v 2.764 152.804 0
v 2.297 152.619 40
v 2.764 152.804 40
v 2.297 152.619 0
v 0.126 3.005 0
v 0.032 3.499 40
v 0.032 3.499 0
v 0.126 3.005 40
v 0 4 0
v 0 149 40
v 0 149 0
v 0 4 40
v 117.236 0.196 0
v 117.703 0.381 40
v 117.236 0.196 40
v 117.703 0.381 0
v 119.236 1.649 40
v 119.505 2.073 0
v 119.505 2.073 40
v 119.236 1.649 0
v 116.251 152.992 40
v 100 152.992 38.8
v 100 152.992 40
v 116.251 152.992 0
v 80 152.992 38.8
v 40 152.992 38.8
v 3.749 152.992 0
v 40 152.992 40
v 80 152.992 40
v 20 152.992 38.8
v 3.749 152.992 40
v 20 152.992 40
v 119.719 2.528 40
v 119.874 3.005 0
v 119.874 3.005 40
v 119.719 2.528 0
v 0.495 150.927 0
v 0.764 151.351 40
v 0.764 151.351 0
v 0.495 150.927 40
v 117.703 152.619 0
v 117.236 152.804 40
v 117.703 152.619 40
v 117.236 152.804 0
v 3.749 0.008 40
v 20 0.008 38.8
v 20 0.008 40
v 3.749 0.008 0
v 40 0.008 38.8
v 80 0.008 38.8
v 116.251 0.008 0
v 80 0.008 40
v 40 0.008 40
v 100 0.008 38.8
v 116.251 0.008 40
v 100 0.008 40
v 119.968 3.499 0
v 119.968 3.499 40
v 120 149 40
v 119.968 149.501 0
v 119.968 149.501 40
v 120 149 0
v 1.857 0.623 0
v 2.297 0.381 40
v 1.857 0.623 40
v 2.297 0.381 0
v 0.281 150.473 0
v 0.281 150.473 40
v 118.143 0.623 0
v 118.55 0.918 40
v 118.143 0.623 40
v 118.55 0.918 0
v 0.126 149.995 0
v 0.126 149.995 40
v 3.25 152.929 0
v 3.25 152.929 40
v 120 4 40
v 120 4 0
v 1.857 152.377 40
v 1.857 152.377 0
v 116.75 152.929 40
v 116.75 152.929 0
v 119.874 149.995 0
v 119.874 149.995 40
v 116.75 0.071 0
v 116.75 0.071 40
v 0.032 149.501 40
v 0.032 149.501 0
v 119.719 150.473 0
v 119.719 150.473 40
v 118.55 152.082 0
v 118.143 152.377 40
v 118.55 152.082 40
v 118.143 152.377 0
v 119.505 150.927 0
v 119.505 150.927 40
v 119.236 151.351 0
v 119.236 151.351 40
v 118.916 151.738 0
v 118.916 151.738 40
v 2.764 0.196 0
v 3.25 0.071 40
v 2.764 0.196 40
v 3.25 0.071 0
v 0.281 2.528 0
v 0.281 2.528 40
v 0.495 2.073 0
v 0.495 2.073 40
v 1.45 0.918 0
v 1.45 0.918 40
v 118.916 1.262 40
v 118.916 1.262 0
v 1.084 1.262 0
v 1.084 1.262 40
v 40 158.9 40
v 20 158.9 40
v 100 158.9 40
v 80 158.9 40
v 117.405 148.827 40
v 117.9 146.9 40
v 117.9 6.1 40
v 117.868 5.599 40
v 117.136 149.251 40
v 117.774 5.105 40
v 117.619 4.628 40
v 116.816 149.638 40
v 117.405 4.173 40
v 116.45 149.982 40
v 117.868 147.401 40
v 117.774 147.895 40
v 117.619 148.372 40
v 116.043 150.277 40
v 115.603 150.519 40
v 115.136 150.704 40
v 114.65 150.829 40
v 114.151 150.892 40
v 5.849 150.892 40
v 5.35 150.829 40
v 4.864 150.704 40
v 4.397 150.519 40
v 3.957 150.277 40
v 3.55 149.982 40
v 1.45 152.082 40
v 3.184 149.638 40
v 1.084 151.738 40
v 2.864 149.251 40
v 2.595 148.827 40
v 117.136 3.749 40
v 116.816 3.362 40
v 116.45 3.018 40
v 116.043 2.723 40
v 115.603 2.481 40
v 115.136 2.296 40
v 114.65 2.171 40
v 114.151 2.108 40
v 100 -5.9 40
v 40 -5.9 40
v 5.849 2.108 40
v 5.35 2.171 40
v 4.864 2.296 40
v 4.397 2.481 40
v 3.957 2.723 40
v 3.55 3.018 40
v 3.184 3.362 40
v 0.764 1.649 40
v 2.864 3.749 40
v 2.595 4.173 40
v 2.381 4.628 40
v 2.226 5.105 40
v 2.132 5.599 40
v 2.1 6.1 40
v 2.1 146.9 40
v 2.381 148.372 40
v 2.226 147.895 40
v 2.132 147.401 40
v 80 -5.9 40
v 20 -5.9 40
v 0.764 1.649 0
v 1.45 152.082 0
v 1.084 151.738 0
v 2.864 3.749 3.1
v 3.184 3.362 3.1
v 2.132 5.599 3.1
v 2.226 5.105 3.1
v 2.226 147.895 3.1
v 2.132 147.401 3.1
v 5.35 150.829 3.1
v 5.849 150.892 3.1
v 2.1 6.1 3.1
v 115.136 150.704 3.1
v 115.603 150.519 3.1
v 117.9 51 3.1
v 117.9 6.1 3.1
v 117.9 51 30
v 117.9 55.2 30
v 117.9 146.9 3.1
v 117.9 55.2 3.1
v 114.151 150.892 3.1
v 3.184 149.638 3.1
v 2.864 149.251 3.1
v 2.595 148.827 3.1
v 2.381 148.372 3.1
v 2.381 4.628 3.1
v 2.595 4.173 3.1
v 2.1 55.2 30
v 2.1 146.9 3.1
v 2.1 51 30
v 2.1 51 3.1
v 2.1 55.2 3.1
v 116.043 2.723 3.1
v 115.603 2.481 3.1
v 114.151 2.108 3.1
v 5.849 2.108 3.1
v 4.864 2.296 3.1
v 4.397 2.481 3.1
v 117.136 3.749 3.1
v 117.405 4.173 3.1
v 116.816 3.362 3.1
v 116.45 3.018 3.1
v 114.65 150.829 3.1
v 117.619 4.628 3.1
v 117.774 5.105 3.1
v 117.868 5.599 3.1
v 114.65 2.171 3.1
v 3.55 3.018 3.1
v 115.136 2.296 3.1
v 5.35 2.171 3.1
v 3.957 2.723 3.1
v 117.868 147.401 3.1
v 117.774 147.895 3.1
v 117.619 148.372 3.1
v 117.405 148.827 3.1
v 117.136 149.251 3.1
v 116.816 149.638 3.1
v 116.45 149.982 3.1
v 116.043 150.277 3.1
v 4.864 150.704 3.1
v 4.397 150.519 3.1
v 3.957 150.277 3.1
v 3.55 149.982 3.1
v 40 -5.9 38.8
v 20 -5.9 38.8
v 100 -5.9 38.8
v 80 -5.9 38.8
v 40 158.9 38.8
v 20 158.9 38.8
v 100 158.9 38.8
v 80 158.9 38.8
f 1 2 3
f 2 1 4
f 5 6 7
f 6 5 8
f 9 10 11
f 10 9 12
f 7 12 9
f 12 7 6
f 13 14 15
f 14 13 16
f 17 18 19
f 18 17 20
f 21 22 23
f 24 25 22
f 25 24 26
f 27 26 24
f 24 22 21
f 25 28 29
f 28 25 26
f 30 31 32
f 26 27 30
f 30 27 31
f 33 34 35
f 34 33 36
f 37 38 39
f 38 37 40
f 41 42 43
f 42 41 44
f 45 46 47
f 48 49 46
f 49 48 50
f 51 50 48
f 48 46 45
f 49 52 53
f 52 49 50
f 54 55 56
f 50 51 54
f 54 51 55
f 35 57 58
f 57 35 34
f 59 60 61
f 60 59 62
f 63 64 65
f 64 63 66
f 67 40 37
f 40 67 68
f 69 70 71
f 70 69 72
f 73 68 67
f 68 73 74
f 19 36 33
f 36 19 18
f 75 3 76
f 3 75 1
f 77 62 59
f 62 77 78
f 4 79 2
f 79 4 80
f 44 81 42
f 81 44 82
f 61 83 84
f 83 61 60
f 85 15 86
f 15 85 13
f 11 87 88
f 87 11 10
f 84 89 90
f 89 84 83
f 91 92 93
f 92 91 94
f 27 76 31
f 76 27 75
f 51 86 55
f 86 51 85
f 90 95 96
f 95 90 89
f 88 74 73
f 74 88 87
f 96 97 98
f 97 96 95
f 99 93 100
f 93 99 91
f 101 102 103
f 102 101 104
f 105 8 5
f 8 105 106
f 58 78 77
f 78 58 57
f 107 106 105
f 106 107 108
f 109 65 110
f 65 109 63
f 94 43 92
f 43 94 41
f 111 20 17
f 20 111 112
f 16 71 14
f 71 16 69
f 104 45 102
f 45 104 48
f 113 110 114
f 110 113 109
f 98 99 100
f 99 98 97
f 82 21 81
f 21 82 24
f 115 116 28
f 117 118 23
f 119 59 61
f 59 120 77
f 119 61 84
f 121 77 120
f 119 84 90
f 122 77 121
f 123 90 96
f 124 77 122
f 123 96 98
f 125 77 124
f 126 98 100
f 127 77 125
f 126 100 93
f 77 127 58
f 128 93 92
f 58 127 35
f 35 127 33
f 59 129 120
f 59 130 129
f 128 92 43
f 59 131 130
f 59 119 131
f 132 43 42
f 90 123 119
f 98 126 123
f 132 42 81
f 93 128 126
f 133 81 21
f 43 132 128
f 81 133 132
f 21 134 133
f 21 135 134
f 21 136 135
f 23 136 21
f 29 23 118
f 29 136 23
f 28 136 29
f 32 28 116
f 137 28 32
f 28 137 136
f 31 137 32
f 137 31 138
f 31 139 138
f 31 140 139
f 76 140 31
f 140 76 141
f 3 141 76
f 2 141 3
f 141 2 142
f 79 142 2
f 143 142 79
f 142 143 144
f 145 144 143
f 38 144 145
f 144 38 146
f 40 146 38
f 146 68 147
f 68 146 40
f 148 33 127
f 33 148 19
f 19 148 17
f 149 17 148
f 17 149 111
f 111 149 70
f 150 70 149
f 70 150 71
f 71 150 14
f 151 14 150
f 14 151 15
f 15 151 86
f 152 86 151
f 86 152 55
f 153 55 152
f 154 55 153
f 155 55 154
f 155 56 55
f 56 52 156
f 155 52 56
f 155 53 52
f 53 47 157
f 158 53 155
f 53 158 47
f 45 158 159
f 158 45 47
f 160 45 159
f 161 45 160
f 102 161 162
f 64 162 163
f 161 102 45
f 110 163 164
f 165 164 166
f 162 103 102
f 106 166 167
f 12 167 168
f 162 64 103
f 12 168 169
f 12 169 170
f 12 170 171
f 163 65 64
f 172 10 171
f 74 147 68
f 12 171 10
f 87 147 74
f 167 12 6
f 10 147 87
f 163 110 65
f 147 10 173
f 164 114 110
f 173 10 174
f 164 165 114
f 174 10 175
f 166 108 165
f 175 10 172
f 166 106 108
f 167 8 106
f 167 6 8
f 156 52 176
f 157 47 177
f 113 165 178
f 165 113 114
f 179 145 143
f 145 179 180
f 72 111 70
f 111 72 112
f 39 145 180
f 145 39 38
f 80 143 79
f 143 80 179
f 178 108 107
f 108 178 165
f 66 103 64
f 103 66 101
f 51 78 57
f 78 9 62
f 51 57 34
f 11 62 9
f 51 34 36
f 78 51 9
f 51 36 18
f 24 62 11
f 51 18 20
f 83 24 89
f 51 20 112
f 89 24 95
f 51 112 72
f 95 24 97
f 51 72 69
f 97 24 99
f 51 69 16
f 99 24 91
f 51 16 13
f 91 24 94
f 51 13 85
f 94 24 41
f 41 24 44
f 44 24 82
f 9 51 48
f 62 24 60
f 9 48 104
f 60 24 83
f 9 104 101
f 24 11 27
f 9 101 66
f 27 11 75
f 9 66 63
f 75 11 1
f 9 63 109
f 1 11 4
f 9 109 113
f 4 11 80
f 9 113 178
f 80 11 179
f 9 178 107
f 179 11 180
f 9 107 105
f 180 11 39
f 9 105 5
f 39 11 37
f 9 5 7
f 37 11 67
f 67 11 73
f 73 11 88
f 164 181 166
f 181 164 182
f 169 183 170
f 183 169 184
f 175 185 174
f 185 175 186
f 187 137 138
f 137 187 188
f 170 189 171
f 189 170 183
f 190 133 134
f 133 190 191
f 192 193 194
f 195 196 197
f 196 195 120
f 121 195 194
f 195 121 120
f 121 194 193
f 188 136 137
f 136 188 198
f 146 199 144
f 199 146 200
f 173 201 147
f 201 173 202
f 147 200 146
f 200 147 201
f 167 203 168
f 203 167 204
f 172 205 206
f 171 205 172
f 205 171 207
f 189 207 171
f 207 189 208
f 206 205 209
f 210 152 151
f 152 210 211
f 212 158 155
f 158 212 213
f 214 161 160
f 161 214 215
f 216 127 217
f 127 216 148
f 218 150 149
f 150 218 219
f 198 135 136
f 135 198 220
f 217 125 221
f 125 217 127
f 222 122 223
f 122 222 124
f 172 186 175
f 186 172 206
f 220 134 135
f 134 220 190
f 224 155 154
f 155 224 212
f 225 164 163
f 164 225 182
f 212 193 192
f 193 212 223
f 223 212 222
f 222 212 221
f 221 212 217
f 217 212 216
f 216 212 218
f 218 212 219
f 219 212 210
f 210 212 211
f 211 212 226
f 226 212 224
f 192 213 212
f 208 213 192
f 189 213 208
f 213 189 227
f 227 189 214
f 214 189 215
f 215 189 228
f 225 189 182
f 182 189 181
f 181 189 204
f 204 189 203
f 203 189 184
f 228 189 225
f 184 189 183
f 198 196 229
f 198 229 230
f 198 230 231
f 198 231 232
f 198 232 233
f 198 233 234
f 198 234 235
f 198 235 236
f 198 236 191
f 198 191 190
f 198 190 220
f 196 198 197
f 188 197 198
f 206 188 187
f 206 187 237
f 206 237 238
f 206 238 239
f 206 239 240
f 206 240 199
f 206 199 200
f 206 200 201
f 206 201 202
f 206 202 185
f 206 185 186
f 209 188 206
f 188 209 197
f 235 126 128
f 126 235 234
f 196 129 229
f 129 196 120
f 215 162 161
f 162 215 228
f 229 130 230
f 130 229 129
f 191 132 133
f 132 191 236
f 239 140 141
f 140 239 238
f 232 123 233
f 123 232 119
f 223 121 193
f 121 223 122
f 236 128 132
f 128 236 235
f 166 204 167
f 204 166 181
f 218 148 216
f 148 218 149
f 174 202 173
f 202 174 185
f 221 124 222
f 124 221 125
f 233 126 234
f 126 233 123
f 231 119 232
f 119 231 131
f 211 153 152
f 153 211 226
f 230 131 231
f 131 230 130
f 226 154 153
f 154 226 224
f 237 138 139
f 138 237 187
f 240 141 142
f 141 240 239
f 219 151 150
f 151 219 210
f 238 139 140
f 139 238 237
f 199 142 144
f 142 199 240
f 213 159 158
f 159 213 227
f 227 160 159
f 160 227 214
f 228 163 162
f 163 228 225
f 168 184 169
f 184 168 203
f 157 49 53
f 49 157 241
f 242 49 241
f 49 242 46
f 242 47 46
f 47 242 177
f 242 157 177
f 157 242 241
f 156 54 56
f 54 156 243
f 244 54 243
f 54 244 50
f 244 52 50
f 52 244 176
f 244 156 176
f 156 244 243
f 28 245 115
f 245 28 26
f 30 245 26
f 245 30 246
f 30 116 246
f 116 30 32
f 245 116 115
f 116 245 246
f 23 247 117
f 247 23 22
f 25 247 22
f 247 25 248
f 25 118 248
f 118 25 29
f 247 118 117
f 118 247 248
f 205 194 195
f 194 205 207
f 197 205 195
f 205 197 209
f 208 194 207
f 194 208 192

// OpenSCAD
/**
    Tray for the 2019 Hyunday Kona EV am rest box.
*/

breite=153;
laenge=120;
tiefe=40;
thick=2.1;
halter_l=20;
halter_w=8;
halter_d=1.2;

// Box
difference(){
    roundedCube([laenge,breite,tiefe],4);    
    translate([thick,thick,thick+1])
        roundedCube([laenge-2*thick,breite-2*thick,tiefe-thick],4);
}

// Halter
translate([halter_l,-halter_w+thick,tiefe-halter_d])
    cube([halter_l,halter_w,halter_d]);
translate([laenge-2*halter_l,-halter_w+thick,tiefe-halter_d])
    cube([halter_l,halter_w,halter_d]); 
translate([halter_l,breite-thick,tiefe-halter_d])
    cube([halter_l,halter_w,halter_d]);
translate([laenge-2*halter_l,breite-thick,tiefe-halter_d])
    cube([halter_l,halter_w,halter_d]);
    
// Teiler

translate([0,breite/3,0])
    cube([laenge,2*thick,3*tiefe/4]);

/*
    cube mit gerundeten Ecken.
    Parameter: Aussenmasse, Radius der Eckenrundungen.
*/
module roundedCube(size, radius,steps=50)
{
    x = size[0];
    y = size[1];
    z = size[2];
    linear_extrude(height=z)
        hull(){
            translate([radius, radius, 0])
            circle(r=radius,$fn=steps);

            translate([x-radius, radius, 0])
            circle(r=radius, $fn=steps);

            translate([x-radius, y-radius, 0])
            circle(r=radius,$fn=steps);

            translate([radius, y-radius, 0])
            circle(r=radius,$fn=steps);
            
        }

}
